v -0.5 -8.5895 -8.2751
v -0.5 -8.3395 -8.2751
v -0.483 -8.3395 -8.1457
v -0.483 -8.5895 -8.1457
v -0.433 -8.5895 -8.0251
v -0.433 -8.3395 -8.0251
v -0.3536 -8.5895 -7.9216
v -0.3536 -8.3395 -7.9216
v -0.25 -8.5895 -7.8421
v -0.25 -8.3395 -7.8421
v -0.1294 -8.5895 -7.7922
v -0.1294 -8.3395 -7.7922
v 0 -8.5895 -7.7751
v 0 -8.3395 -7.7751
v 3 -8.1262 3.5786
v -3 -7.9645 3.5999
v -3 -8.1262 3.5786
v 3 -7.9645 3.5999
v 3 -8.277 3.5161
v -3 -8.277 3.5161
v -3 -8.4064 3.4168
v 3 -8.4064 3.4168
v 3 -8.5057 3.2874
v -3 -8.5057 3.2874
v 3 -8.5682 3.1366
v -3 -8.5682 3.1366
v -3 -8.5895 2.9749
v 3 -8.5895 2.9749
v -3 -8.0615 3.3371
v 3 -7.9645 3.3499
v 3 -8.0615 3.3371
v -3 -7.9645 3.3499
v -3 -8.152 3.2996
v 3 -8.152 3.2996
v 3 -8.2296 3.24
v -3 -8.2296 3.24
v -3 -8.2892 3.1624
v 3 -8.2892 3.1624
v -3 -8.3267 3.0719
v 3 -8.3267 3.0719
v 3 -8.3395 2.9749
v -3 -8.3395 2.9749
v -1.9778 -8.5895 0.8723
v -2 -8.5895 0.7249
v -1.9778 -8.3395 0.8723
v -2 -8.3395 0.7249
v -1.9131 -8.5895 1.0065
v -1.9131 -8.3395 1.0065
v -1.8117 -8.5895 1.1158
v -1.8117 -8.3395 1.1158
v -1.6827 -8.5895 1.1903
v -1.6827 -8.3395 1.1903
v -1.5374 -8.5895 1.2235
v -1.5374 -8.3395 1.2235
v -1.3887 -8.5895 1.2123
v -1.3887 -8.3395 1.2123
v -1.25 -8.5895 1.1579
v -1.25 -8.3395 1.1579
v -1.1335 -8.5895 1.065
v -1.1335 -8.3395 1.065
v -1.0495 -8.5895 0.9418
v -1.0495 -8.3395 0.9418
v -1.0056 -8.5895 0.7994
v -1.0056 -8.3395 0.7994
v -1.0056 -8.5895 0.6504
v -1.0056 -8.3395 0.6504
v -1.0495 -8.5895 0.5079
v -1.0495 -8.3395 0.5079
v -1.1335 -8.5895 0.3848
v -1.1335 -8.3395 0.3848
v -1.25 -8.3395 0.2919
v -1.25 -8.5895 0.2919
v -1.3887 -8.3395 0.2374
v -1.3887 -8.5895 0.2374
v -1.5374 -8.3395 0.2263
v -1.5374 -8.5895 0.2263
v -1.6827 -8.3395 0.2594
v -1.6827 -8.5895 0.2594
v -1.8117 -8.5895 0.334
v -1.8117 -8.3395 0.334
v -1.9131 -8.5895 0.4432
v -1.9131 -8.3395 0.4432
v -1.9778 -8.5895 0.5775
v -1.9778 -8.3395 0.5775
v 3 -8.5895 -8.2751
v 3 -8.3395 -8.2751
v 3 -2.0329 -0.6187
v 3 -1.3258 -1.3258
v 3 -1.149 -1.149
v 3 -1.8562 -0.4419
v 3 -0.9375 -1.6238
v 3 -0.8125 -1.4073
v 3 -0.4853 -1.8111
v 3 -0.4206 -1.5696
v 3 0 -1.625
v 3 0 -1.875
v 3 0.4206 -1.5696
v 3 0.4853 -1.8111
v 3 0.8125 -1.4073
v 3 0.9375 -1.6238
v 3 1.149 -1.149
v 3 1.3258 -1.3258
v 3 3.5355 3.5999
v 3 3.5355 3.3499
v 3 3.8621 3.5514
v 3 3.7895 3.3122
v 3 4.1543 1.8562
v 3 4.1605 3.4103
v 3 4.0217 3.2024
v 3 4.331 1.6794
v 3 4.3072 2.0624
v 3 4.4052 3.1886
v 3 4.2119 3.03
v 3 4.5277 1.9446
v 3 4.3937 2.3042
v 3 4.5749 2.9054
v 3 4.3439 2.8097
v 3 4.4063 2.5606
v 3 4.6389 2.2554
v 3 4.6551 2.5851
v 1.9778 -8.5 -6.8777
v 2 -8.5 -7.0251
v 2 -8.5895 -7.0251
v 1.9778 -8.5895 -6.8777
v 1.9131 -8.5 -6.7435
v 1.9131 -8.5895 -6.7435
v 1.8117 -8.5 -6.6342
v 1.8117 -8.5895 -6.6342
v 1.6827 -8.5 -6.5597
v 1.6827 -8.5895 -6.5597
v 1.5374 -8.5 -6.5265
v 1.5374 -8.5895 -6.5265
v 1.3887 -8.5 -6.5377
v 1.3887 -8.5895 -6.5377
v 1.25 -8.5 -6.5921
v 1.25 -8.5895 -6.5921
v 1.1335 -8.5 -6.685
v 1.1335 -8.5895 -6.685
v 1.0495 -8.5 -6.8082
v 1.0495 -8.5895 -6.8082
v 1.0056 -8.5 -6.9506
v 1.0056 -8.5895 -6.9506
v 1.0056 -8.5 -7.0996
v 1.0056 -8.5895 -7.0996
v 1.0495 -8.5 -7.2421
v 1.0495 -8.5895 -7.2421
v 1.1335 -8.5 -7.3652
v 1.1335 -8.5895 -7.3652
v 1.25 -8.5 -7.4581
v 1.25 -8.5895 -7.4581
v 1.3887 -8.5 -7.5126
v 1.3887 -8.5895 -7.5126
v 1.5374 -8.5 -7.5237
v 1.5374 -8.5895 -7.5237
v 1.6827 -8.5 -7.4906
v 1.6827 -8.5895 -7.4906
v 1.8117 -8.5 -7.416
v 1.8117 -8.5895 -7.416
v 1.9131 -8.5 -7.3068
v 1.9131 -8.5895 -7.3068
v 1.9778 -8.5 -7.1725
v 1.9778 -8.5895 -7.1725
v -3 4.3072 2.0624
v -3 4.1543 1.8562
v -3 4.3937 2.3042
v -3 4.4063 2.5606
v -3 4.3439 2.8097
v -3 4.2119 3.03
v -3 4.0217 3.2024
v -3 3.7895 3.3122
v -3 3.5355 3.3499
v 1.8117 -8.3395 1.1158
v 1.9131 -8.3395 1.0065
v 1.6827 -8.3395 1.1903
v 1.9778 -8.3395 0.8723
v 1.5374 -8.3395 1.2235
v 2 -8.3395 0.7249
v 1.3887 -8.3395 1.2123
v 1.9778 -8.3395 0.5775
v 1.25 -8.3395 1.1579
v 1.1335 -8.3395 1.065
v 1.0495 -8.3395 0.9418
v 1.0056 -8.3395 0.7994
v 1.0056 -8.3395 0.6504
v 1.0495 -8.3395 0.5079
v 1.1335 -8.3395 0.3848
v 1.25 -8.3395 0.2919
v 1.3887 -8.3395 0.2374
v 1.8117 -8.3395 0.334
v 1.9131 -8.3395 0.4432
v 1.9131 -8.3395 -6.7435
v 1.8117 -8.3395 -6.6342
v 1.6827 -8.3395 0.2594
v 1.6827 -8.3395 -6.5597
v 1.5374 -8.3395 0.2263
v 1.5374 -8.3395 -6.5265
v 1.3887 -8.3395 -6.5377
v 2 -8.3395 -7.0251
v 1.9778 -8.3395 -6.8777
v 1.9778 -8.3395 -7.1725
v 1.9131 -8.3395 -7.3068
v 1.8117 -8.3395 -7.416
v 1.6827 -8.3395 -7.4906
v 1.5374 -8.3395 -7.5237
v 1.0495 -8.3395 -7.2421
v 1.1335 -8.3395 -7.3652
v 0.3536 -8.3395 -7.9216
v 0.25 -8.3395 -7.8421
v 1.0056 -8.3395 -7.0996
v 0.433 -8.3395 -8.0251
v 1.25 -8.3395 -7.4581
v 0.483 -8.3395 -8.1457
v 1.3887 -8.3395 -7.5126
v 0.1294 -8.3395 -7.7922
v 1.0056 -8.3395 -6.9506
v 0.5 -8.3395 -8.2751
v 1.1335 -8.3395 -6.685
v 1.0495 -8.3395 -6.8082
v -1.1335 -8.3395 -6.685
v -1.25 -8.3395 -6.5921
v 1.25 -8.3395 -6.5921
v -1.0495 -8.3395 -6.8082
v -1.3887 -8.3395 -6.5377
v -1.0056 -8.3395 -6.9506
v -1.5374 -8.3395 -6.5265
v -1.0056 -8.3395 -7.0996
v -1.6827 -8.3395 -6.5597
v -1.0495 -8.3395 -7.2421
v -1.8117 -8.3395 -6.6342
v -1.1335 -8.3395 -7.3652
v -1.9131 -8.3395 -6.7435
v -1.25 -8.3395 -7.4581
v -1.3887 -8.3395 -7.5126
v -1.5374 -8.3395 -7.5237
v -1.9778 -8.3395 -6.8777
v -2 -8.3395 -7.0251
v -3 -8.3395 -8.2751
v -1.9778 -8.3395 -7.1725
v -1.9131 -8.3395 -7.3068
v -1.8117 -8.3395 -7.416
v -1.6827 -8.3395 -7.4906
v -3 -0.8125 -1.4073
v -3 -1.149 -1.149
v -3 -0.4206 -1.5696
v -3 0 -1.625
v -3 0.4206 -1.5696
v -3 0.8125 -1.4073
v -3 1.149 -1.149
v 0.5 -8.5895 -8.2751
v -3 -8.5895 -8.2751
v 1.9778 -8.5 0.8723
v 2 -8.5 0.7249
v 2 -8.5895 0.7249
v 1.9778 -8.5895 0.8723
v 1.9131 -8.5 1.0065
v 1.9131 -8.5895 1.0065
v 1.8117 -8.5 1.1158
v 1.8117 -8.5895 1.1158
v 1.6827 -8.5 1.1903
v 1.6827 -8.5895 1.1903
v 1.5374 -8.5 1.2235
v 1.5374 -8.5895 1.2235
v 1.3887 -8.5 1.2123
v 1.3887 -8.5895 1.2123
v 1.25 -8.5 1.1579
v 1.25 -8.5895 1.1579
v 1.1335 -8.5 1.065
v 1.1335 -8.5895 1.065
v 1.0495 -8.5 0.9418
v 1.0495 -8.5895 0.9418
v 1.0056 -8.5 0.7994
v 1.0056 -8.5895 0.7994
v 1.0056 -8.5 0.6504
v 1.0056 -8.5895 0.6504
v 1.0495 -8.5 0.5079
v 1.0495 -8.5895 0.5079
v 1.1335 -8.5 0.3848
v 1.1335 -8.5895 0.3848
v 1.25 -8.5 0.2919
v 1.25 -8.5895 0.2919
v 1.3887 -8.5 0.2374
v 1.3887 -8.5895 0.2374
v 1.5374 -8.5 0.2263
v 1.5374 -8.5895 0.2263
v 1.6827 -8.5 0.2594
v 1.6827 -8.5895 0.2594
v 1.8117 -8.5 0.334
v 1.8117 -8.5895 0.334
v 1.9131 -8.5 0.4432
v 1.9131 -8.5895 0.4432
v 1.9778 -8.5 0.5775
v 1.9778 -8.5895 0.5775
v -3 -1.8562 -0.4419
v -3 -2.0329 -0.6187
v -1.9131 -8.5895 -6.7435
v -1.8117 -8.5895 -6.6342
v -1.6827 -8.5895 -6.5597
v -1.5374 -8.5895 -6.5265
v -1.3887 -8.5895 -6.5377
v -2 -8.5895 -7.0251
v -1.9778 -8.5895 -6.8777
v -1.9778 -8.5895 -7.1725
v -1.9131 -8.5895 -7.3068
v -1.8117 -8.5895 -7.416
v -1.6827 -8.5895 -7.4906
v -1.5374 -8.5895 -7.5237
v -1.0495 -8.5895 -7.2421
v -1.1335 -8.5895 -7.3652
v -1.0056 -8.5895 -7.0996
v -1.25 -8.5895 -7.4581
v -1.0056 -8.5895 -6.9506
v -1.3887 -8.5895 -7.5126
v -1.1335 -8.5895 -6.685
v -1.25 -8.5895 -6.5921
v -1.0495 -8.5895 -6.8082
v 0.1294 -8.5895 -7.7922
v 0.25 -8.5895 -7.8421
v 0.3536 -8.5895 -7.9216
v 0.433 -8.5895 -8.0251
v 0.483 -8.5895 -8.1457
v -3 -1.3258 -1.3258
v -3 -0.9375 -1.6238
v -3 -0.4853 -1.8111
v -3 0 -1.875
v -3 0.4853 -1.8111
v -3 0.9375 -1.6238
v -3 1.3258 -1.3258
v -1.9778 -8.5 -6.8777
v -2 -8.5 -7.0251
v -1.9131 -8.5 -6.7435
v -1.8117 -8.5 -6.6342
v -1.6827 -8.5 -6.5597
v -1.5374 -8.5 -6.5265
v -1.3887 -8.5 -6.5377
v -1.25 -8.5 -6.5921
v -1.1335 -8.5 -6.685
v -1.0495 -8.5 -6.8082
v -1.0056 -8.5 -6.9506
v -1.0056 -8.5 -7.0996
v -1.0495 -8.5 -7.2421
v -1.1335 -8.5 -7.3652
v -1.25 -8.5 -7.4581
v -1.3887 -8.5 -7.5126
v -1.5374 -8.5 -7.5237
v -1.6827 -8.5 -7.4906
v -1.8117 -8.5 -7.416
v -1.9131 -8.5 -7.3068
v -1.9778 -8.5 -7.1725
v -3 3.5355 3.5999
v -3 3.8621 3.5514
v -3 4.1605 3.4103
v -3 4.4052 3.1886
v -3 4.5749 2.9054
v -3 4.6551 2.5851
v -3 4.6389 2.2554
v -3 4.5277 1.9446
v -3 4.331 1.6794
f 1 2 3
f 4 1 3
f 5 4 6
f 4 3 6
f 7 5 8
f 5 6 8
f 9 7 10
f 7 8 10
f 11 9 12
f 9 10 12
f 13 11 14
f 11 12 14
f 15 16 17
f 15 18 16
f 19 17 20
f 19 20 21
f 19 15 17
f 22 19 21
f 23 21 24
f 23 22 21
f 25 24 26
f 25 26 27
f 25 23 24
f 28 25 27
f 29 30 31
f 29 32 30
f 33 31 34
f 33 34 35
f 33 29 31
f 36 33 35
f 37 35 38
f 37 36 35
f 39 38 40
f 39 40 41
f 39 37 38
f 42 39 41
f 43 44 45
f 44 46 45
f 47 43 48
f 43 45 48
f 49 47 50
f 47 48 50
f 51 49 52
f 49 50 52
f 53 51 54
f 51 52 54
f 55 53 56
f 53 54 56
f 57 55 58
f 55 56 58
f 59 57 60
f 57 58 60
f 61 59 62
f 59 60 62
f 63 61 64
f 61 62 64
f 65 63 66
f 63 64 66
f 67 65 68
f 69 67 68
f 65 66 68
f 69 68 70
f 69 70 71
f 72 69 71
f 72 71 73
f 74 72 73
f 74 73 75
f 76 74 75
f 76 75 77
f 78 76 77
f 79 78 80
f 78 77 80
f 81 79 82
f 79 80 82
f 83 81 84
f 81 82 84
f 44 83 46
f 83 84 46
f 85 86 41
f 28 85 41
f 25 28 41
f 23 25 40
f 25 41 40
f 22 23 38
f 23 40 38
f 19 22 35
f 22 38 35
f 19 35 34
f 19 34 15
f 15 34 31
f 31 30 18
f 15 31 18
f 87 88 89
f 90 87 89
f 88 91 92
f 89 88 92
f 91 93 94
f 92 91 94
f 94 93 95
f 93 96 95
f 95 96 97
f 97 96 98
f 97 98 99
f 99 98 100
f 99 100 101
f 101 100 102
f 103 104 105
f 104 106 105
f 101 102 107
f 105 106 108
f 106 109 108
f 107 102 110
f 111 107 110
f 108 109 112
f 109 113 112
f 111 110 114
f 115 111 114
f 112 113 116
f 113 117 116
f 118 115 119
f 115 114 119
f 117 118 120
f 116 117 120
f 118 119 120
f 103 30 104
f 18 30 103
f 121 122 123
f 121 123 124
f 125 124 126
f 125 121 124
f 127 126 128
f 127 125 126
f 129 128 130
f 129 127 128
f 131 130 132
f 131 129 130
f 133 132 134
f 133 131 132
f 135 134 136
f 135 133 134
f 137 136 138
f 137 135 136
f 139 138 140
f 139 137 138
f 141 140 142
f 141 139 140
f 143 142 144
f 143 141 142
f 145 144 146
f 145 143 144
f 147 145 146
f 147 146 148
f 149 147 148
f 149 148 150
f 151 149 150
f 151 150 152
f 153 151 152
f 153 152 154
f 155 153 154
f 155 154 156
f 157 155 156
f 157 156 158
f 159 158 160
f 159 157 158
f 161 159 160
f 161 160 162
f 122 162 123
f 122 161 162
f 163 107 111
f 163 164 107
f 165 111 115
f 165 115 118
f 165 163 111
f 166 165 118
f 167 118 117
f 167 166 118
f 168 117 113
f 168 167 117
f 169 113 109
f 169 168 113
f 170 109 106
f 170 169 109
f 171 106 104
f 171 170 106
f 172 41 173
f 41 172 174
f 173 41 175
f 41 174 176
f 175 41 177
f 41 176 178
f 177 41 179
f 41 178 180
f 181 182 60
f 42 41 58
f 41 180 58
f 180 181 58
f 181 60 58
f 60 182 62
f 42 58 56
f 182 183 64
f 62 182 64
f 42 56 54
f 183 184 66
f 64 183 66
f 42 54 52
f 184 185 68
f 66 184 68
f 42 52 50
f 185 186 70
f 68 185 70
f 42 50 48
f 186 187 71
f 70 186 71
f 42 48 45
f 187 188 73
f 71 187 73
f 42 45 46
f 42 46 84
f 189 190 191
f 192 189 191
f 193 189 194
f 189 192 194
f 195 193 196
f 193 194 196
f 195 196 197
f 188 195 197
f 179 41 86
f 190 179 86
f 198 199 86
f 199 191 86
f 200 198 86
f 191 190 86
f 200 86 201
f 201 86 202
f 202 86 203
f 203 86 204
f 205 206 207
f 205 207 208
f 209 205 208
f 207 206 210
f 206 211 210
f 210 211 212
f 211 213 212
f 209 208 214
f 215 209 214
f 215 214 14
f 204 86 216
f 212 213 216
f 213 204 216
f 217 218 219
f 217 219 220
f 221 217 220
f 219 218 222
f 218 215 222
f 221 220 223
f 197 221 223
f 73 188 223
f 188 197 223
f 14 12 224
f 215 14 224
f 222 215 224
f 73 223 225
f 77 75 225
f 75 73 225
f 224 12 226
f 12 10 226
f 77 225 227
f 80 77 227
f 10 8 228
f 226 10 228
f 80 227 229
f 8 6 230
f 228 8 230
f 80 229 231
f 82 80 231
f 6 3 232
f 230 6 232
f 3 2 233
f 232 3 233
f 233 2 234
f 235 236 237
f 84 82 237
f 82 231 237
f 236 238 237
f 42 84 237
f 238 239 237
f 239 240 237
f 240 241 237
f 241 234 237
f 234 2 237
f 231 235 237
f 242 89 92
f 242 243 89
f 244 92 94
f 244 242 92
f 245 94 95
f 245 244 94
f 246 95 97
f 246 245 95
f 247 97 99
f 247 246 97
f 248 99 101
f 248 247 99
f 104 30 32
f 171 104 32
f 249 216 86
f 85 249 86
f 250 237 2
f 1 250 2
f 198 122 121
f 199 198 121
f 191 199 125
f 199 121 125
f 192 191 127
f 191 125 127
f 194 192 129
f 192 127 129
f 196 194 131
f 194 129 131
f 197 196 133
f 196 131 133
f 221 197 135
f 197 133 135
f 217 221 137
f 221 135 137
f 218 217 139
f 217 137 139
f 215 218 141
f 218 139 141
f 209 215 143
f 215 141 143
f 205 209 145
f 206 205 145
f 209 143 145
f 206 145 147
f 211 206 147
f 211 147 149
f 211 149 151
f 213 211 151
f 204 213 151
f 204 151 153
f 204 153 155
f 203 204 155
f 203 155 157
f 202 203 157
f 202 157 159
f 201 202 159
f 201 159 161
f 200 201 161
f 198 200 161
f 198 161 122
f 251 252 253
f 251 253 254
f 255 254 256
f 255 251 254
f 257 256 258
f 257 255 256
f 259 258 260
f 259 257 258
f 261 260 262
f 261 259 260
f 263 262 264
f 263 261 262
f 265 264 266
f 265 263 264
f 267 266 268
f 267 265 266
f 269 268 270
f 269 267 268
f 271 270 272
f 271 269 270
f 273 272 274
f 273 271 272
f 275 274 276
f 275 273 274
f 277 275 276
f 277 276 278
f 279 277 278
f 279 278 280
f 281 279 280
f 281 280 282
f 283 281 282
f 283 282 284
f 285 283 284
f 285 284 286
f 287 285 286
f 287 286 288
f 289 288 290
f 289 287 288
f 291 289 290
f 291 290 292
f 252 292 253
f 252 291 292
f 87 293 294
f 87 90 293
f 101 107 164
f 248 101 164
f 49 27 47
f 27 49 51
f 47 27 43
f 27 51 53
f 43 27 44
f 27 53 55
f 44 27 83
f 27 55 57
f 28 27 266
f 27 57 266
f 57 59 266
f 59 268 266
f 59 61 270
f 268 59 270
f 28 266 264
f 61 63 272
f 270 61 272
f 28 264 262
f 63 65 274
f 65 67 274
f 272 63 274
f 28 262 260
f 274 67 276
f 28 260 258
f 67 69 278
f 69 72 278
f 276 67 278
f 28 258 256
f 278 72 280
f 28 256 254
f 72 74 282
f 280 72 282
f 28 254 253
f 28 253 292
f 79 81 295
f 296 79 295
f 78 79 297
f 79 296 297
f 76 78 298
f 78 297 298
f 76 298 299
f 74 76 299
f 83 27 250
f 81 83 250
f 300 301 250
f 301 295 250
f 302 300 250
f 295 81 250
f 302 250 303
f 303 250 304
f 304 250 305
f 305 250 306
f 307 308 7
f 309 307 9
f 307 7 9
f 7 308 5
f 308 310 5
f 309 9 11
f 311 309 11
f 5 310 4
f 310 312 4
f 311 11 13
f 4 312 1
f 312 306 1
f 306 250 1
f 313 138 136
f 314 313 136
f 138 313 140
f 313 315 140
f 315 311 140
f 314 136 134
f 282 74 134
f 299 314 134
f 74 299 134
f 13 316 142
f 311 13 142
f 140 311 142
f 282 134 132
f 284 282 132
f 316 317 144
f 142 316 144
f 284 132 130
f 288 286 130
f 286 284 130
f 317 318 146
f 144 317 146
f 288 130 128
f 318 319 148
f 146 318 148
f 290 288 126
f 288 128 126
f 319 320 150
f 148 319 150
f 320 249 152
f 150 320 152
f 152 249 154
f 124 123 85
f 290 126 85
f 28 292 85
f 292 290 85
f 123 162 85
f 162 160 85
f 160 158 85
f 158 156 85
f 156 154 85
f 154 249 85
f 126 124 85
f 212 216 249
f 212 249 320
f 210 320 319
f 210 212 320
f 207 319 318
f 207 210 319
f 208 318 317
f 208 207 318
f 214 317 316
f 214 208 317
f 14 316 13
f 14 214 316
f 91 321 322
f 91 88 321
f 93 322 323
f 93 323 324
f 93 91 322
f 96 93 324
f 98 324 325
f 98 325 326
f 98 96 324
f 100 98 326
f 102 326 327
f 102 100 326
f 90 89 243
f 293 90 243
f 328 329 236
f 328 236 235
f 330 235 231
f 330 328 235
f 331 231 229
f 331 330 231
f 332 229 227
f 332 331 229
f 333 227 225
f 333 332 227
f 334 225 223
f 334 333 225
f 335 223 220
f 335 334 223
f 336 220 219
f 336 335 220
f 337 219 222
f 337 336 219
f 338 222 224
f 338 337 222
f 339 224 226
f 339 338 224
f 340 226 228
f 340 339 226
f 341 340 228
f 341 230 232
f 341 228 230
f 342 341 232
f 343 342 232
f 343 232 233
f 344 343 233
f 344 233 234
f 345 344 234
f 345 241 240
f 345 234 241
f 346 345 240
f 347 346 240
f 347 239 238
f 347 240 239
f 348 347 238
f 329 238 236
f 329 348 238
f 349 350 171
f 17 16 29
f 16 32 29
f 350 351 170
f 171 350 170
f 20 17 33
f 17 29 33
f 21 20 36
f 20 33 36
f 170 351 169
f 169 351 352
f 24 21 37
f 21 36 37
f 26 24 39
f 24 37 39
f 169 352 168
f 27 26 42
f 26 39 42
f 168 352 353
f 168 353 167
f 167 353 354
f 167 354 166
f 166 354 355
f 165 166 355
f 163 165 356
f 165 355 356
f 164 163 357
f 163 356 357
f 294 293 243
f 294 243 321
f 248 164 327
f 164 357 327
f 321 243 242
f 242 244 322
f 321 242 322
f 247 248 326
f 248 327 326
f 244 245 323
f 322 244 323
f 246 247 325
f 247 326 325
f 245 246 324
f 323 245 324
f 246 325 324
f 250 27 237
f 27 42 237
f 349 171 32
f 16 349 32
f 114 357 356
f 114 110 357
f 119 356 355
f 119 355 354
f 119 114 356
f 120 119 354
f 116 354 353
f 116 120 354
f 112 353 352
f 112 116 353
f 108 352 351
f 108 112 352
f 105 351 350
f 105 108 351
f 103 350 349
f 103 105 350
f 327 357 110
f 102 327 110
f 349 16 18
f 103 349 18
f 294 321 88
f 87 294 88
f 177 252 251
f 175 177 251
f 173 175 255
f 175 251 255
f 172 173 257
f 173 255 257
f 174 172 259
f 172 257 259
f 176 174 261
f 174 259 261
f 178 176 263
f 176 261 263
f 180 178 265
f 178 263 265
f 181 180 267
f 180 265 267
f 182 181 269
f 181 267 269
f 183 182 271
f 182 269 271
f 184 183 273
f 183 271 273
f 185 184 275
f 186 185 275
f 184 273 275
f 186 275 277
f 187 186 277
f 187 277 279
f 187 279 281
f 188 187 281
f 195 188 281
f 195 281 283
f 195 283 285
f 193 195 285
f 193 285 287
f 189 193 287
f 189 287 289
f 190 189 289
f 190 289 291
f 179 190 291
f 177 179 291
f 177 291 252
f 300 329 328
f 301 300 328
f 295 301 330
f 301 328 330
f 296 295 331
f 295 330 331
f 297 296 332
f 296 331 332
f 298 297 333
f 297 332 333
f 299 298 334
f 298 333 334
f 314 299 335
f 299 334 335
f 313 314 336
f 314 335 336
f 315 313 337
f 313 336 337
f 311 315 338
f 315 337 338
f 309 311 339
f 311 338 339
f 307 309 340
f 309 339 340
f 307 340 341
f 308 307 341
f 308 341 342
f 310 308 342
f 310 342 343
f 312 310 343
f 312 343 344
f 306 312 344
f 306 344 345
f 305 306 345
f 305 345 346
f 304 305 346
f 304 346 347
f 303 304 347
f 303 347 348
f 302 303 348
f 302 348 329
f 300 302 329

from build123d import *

# Parameters (mm, degrees)
SKETCH002_W       = 6
SKETCH002_H       = 0.25
SKETCH003_R       = 0.5
POCKET_DEPTH      = 5
POCKET_DEPTH_BACK = 5


with BuildPart() as part:
    # AdditivePipe: sweep along a path in Sketch
    with BuildLine(Plane.YZ) as additivepipe_path:
        Line((-1.944544, -0.53033), (-1.237437, -1.237437))
        ThreePointArc((-1.237437, -1.237437), (0, -1.75), (1.237437, -1.237437))
        Line((1.237437, -1.237437), (4.242641, 1.767767))
        ThreePointArc((4.242641, 1.767767), (4.459413, 2.857557), (3.535534, 3.474874))
        Line((3.535534, 3.474874), (-7.964466, 3.474874))
        ThreePointArc((-7.964466, 3.474874), (-8.318019, 3.328427), (-8.464466, 2.974874))
        Line((-8.464466, 2.974874), (-8.464466, -8.275126))
    # Sketch002 (on DatumPlane) → AdditivePipe (sweep)
    with BuildSketch(Plane.XY.offset(-8)):
        with Locations((0, -8.464466)):
            Rectangle(SKETCH002_W, SKETCH002_H)
    sweep(path=additivepipe_path.line)

    # Sketch003 (on DatumPlane) → Pocket (cut, two sides)
    with BuildSketch(Plane.XZ.offset(8.5)) as pocket_sk:
        with Locations((1.5, -7.025126)):
            Circle(SKETCH003_R)
        with Locations((1.5, 0.724874)):
            Circle(SKETCH003_R)
        with BuildLine():
            Line((0, -8.275126), (0, -7.775126))
            ThreePointArc((0.5, -8.275126), (0.353553, -7.921573), (0, -7.775126))
            Line((0, -8.275126), (0.5, -8.275126))
        make_face()
    pocket = extrude(amount=POCKET_DEPTH, mode=Mode.SUBTRACT) + extrude(pocket_sk.sketch, amount=-POCKET_DEPTH_BACK, mode=Mode.SUBTRACT)

    # Mirrored: Pocket across Sketch003 V_Axis
    add(pocket.mirror(Plane(origin=(0, -8.5, 0), x_dir=(0, -1, 0), z_dir=(1, 0, 0))), mode=Mode.SUBTRACT)


solid = part.part
